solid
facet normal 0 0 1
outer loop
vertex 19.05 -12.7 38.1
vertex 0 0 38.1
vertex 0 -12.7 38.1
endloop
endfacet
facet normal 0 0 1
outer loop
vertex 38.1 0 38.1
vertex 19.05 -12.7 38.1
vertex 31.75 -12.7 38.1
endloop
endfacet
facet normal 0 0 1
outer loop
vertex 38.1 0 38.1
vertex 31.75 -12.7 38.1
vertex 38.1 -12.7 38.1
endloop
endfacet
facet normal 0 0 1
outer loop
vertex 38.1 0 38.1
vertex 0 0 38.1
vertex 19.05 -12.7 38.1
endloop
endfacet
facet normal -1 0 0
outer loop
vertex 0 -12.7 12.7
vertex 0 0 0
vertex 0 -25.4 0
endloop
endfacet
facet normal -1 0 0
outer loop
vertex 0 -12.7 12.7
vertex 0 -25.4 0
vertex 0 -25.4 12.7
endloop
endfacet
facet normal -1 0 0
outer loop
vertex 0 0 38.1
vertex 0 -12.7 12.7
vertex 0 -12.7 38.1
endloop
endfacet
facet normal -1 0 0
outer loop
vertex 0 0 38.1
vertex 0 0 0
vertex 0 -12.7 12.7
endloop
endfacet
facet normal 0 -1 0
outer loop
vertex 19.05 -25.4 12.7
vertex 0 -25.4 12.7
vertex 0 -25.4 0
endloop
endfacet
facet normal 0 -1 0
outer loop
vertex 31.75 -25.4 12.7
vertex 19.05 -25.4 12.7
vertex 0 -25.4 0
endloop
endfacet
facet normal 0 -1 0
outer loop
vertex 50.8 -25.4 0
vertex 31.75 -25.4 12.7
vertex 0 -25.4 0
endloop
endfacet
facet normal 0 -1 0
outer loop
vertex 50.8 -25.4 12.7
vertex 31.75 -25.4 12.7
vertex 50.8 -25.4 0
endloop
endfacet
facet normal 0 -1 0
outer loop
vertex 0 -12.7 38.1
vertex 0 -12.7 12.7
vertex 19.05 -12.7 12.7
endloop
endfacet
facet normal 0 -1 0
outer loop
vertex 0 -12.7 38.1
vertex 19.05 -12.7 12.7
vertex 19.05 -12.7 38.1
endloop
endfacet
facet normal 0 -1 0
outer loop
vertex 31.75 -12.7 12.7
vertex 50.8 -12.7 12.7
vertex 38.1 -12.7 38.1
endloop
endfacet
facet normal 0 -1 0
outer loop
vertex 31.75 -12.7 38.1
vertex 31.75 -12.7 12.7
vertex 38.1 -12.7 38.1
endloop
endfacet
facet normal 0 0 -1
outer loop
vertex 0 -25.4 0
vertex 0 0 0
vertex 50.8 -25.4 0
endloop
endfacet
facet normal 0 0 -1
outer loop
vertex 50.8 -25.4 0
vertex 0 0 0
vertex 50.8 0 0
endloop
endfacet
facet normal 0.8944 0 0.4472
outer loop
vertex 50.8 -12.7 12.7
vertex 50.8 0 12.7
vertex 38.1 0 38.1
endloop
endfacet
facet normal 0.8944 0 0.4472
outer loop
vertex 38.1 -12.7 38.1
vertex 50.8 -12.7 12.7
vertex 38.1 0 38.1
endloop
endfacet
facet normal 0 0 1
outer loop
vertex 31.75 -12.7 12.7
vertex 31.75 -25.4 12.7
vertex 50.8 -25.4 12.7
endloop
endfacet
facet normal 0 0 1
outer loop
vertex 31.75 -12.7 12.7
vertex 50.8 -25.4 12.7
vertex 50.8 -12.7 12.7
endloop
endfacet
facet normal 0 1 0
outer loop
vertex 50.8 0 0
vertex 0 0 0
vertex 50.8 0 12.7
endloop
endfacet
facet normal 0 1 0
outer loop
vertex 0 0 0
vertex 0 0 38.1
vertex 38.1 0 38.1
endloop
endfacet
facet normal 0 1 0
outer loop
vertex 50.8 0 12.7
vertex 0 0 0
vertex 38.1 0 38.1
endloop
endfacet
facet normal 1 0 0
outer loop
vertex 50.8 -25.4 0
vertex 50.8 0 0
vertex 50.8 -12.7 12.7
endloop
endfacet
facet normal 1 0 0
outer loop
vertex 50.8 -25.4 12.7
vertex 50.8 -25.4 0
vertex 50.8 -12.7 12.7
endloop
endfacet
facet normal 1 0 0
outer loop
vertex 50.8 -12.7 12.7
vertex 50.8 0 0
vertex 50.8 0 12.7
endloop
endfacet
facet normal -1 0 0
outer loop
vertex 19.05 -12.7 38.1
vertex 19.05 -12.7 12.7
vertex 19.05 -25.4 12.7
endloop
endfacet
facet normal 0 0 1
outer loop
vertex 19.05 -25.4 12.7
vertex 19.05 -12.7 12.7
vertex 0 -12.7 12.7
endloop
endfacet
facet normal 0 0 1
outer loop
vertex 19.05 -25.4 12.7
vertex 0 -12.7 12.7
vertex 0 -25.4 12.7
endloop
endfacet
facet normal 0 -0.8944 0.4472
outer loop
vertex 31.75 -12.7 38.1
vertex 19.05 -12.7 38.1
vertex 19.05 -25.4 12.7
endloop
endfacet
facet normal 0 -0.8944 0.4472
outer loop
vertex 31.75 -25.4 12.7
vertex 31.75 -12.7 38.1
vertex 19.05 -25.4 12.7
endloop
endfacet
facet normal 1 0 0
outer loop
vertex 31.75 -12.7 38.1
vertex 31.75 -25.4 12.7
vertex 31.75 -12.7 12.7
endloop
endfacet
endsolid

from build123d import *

# Parameters (mm, degrees)
F0_W      = 50.8
F0_H      = 38.1
F1_DEPTH  = 25.4
F2_W      = 12.7
F2_H      = 19.05
F3_DEPTH  = 19.05
F4_W      = 12.7
F4_H      = 25.4
F5_DEPTH  = 19.05
F6_W      = 12.7
F6_H      = 6.35
F7_DEPTH  = 19.05
F9_DEPTH  = 25.4
F11_DEPTH = 25.4


with BuildPart() as f1:
    # F0 (on Front) → F1 (new body)
    with BuildSketch(Plane.XZ):
        with Locations((25.4, 19.05)):
            Rectangle(F0_W, F0_H)
    extrude(amount=F1_DEPTH)

    # F2 (on face) → F3 (cut)
    with BuildSketch(Plane(origin=(0, 0, 0), x_dir=(0, -1, 0), z_dir=(-1, 0, 0))):
        with Locations((19.05, 28.575)):
            Rectangle(F2_W, F2_H)
    extrude(amount=-F3_DEPTH, mode=Mode.SUBTRACT)

    # F4 (on face) → F5 (cut)
    with BuildSketch(Plane.YZ.offset(50.8)):
        with Locations((-19.05, 25.4)):
            Rectangle(F4_W, F4_H)
    extrude(amount=-F5_DEPTH, mode=Mode.SUBTRACT)

    # F6 (on face) → F7 (cut)
    with BuildSketch(Plane(origin=(0, 0, 0), x_dir=(0, -1, 0), z_dir=(-1, 0, 0))):
        with Locations((19.05, 15.875)):
            Rectangle(F6_W, F6_H)
    extrude(amount=-F7_DEPTH, mode=Mode.SUBTRACT)

    # F8 (on face) → F9 (cut)
    with BuildSketch(Plane(origin=(19.05, 0, 0), x_dir=(0, -1, 0), z_dir=(-1, 0, 0))):
        Polygon((25.4, 38.1), (12.7, 38.1), (25.4, 12.7), align=None)
    extrude(amount=-F9_DEPTH, mode=Mode.SUBTRACT)

    # F10 (on face) → F11 (cut)
    with BuildSketch(Plane(origin=(0, 0, 0), x_dir=(-1, 0, 0), z_dir=(0, 1, 0))):
        Polygon((-50.8, 12.7), (-38.1, 38.1), (-50.8, 38.1), align=None)
    extrude(amount=-F11_DEPTH, mode=Mode.SUBTRACT)


solid = f1.part
